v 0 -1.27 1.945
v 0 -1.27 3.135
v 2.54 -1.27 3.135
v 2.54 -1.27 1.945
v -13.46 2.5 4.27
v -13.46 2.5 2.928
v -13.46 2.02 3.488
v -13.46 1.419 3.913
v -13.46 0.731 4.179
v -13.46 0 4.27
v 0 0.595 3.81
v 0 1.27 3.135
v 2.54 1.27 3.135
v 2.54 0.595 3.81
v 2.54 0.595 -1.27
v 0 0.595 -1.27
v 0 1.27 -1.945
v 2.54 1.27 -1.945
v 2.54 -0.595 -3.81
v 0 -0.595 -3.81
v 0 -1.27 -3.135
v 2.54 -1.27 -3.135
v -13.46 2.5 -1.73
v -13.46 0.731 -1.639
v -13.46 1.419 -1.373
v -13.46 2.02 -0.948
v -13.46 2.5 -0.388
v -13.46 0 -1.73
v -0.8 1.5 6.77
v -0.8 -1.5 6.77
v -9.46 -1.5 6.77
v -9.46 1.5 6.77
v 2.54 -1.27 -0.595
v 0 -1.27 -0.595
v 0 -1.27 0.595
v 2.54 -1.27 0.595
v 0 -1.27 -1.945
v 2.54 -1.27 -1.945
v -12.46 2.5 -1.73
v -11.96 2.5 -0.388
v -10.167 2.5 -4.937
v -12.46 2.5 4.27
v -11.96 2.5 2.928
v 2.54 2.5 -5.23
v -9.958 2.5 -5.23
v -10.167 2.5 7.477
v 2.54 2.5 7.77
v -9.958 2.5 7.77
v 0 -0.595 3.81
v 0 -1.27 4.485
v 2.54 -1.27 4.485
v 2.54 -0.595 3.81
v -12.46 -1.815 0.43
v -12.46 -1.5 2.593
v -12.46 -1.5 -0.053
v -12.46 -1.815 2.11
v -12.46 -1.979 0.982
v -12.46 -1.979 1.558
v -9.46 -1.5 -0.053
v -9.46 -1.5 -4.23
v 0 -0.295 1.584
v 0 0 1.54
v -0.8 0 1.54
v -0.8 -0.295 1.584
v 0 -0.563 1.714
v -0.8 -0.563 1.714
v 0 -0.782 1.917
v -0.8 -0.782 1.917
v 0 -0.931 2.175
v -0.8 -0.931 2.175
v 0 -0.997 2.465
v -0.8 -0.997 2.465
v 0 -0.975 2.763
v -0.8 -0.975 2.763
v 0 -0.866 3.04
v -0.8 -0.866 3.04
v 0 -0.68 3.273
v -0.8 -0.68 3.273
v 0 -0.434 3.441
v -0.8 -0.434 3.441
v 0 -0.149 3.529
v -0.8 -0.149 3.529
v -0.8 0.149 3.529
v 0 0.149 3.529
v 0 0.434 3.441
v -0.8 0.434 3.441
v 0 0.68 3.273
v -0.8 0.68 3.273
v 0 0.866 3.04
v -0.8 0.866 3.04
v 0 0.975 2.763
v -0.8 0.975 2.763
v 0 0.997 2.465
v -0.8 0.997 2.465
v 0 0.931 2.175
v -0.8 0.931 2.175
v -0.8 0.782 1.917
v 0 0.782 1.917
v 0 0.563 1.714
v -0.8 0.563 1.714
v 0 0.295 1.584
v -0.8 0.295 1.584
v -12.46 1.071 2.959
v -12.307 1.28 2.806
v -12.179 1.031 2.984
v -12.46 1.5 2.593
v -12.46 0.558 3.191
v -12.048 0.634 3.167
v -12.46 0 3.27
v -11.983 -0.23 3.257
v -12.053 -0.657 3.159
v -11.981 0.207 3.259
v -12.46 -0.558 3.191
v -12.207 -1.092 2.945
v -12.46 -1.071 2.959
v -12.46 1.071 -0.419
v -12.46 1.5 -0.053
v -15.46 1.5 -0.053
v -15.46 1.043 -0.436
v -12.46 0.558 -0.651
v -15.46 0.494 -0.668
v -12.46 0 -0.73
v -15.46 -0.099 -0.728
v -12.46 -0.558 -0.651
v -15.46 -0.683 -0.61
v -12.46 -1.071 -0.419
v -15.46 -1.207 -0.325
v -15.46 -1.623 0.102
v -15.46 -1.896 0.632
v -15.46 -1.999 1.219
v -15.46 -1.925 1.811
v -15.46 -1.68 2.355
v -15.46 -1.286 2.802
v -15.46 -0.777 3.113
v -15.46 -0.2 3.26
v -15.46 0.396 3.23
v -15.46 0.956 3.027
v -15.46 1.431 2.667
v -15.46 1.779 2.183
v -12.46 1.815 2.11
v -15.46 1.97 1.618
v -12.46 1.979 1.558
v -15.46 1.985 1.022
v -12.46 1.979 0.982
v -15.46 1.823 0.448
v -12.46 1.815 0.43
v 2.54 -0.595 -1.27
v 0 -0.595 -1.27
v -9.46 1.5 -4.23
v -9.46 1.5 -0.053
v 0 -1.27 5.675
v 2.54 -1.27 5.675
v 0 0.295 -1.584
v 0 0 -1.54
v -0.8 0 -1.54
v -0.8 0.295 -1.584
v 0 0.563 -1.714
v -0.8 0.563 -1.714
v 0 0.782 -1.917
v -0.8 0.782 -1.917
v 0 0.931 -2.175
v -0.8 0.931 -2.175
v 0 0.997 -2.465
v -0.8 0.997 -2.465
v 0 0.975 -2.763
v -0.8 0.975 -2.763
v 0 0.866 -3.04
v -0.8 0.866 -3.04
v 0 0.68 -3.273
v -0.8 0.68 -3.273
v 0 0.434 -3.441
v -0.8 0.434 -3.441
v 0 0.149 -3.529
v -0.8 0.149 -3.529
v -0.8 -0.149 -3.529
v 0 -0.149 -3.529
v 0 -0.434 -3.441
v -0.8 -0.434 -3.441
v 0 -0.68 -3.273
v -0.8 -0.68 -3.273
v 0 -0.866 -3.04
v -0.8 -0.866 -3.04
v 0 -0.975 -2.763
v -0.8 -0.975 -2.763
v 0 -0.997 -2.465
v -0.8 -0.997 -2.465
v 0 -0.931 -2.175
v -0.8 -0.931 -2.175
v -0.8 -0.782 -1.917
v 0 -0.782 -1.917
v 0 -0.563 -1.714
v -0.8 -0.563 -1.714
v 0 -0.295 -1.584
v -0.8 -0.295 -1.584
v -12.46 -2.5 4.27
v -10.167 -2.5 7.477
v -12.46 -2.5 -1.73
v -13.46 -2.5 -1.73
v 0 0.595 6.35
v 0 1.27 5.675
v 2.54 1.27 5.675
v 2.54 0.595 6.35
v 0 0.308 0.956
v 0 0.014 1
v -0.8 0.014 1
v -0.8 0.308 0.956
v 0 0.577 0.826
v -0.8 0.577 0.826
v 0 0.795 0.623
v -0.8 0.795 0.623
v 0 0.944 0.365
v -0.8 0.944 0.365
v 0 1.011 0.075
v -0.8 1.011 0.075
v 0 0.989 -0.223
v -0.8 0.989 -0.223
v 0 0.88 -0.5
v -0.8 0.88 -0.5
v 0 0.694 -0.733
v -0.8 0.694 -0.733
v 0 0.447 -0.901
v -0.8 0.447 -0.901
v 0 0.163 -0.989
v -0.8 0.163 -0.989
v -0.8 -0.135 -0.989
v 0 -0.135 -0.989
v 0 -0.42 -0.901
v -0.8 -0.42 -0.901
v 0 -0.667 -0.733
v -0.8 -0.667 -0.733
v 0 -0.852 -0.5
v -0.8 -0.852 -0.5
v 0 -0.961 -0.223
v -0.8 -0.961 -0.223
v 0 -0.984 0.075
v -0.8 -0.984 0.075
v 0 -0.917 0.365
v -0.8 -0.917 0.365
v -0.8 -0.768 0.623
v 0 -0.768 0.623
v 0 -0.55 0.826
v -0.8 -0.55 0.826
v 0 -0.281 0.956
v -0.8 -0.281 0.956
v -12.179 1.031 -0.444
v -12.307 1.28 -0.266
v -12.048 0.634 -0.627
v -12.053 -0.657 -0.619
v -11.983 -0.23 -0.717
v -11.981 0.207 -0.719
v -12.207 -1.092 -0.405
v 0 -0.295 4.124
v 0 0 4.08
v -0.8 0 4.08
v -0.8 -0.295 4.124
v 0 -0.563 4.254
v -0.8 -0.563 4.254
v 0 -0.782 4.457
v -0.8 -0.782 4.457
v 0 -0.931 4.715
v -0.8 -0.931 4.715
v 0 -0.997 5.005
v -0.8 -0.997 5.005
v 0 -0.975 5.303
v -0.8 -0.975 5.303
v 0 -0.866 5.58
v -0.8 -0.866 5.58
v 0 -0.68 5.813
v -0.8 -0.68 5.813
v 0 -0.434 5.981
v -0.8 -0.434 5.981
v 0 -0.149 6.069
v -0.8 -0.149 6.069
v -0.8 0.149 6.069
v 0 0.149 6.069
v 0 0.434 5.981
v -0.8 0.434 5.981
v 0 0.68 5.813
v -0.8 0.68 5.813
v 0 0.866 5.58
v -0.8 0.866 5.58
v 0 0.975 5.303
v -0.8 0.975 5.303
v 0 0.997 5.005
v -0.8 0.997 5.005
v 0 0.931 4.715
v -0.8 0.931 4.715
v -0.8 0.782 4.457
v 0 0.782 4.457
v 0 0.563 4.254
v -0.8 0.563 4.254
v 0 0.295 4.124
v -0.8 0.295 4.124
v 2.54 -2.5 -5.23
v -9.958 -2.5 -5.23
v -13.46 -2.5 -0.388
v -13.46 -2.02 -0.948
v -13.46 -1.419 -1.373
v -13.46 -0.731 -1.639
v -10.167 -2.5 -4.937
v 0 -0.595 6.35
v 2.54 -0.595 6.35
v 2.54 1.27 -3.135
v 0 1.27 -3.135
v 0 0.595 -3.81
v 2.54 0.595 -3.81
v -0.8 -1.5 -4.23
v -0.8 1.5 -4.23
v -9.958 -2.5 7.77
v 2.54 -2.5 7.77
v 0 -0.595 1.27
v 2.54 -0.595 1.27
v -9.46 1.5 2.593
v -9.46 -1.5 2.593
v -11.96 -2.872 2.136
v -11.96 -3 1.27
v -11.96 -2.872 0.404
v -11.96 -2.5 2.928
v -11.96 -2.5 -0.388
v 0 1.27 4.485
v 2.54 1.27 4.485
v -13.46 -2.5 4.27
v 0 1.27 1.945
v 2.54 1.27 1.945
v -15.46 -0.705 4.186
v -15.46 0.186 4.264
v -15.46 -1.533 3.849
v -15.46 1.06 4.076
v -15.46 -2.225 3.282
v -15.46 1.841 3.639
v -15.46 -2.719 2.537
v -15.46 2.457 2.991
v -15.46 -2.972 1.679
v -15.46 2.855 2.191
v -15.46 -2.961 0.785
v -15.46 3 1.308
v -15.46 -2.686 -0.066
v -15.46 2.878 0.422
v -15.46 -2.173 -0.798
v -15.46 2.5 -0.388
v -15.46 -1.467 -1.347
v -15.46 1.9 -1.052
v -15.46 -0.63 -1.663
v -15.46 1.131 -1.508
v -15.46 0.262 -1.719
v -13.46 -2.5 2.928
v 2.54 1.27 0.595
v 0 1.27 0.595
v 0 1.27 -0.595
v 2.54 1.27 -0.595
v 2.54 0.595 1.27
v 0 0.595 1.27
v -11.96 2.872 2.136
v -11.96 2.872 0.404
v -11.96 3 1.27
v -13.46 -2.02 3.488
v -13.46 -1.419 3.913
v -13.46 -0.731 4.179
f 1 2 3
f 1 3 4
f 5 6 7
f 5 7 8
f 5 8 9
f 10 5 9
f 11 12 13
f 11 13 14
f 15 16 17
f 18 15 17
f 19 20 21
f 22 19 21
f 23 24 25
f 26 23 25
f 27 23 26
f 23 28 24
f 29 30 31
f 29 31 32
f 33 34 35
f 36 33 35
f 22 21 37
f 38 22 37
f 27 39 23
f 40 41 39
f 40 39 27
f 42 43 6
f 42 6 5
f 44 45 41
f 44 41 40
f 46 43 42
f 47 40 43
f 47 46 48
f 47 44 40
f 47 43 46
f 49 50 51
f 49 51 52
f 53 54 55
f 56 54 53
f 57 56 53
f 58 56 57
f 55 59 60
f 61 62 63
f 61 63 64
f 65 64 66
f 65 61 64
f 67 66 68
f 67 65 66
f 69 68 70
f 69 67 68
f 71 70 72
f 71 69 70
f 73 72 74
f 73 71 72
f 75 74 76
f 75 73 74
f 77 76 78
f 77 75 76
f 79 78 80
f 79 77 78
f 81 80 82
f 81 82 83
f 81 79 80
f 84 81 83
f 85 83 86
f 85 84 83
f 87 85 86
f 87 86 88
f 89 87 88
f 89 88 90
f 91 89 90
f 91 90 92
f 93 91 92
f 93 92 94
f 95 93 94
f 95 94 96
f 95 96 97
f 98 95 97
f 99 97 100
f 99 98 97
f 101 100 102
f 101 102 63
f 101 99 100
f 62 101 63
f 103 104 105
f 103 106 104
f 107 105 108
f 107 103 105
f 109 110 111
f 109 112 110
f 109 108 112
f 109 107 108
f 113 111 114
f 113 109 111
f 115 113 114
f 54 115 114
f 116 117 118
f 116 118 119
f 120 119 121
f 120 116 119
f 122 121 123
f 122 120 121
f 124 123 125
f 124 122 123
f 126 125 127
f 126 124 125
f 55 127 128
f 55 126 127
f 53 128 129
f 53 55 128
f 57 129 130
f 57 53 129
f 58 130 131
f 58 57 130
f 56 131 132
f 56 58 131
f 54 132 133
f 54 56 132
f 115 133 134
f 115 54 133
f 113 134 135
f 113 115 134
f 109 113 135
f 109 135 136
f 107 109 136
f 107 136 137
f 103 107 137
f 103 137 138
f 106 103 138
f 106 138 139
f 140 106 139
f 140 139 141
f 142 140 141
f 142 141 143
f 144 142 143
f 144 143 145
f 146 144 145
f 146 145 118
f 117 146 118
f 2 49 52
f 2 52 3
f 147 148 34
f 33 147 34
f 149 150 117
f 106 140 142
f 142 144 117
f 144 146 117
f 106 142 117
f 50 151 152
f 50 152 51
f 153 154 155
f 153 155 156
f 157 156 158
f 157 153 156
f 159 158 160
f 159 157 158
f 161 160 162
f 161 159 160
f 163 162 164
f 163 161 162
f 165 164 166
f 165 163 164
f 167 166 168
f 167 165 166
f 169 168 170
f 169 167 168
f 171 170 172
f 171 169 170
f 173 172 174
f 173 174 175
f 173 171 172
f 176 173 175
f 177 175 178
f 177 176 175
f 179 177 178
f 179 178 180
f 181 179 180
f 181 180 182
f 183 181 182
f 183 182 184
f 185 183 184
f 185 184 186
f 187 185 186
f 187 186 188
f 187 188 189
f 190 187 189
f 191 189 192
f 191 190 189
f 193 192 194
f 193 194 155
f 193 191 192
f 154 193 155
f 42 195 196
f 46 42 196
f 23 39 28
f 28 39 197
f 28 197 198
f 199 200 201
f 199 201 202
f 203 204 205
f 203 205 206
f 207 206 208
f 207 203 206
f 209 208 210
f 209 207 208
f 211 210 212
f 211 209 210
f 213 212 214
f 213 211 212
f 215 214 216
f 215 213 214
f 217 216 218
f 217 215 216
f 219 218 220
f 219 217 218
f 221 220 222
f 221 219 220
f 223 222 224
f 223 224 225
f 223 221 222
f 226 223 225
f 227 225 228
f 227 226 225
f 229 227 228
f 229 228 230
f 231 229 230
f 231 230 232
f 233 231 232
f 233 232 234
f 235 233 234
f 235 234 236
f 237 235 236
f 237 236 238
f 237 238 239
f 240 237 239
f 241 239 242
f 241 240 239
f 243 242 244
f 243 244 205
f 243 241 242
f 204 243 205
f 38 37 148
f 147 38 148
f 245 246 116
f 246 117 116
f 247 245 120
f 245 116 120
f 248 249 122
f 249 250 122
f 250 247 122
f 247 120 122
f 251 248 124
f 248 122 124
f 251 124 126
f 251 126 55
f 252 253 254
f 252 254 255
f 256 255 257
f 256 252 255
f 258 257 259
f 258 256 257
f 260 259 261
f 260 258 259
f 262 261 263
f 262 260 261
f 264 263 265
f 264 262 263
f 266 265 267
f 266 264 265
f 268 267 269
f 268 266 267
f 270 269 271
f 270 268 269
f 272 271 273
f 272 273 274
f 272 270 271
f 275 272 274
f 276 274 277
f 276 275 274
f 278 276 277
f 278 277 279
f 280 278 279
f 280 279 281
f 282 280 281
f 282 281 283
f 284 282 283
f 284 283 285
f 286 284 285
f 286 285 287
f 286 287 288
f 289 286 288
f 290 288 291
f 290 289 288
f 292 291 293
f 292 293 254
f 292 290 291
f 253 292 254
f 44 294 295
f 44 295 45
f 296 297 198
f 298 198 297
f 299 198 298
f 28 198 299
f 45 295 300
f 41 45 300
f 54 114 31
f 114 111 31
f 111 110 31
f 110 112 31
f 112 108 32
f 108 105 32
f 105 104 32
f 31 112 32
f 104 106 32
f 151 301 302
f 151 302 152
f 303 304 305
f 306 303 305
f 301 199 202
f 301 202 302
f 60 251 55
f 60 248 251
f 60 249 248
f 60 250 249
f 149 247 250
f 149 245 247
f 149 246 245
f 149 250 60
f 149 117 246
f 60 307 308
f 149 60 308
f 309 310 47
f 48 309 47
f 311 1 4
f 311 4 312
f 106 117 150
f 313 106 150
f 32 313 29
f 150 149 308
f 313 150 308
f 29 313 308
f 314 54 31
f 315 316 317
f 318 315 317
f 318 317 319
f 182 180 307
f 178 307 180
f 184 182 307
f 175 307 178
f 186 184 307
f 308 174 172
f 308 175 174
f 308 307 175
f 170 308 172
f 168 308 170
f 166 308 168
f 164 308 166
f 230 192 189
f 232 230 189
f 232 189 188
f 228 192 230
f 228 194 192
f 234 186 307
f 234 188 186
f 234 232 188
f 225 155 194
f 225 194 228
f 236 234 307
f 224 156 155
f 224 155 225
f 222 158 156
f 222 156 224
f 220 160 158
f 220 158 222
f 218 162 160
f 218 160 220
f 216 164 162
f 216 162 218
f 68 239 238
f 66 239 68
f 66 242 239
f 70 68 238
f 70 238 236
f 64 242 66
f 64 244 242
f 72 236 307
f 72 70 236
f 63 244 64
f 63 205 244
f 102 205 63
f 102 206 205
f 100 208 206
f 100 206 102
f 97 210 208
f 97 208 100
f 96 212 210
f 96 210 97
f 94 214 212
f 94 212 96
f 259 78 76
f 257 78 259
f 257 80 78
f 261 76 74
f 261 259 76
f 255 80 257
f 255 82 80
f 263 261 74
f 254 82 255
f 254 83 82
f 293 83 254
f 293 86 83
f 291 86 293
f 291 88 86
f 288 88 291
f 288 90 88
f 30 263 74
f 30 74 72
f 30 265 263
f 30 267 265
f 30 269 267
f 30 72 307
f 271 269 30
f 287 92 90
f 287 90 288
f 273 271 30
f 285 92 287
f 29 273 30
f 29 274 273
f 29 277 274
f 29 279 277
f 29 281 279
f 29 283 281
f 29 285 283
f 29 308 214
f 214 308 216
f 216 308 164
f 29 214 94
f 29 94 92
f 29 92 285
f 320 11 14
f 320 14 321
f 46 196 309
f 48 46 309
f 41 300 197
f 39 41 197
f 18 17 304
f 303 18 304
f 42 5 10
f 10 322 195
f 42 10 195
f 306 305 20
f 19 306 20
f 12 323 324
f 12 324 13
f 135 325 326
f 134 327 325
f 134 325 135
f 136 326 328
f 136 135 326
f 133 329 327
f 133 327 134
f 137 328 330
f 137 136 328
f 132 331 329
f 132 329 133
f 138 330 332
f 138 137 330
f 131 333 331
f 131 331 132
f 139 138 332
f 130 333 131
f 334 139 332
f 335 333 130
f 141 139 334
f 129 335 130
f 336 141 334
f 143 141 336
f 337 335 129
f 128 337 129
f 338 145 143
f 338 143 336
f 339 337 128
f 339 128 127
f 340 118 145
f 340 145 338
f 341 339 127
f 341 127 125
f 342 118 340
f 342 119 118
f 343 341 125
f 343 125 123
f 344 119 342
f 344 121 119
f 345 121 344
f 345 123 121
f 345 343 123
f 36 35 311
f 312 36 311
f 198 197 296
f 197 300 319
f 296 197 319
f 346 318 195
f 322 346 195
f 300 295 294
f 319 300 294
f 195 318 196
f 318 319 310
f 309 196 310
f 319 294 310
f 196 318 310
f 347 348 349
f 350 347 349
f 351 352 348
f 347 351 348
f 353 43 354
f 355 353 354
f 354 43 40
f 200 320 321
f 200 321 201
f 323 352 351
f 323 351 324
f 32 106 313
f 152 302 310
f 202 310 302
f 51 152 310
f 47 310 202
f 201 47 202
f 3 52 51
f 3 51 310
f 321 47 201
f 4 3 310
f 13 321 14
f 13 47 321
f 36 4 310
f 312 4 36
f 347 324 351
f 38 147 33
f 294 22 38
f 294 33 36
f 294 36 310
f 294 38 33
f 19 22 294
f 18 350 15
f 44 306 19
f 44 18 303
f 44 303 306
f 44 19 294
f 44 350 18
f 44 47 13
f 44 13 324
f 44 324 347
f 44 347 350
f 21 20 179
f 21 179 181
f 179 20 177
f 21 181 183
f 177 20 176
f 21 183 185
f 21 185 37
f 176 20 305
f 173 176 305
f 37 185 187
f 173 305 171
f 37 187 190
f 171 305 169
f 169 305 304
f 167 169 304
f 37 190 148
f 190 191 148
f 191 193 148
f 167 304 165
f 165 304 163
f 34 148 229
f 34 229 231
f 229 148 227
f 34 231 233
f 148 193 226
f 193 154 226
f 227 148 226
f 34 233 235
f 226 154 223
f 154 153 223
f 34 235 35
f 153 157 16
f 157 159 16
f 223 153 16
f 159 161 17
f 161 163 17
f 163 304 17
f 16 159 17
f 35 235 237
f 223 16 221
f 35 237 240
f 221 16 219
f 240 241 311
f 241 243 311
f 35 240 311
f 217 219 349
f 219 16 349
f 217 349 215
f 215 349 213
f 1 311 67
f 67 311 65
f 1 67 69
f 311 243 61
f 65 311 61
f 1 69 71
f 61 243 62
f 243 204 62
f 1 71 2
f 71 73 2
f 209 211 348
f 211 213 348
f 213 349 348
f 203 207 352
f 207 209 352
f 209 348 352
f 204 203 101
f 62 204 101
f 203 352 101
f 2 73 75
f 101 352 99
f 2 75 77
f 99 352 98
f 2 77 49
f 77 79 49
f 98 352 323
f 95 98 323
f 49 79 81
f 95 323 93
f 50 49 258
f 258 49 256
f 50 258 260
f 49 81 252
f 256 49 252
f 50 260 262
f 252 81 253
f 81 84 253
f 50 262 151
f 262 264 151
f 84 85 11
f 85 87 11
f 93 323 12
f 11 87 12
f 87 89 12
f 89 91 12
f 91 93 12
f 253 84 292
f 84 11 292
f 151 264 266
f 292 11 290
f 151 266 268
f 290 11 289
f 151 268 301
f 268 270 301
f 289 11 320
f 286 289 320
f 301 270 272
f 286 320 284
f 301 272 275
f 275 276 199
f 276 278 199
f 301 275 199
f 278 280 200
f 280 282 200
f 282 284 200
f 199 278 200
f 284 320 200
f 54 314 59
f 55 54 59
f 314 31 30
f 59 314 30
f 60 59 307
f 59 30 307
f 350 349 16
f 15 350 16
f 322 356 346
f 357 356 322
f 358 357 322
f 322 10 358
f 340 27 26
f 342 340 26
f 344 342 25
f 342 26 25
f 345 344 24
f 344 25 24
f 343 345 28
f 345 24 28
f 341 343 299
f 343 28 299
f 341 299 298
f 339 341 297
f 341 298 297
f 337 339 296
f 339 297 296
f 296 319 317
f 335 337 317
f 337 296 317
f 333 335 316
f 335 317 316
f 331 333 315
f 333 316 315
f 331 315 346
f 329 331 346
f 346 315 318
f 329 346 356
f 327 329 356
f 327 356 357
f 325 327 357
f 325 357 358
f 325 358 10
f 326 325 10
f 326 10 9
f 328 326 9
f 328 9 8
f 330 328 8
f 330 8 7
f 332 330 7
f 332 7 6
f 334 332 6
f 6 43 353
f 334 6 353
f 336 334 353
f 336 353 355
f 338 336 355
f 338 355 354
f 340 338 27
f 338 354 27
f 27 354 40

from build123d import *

# Parameters (mm, degrees)
CROQUIS1_W                     = 0.64
CROQUIS1_H                     = 0.64
SALIENTE_EXTRUIR1_DEPTH        = 2.54
SALIENTE_EXTRUIR2_DEPTH        = 8.54
SALIENTE_EXTRUIR2_DEPTH_BACK   = 3
CROQUIS3_W                     = 0.64
CROQUIS3_H                     = 0.64
SALIENTE_EXTRUIR2_2_DEPTH      = 8.54
SALIENTE_EXTRUIR2_2_DEPTH_BACK = 3
CHAFL_N1_SIZE                  = 0.2
CHAFL_N2_SIZE                  = 0.2
CROQUIS1_4_W                   = 11
CROQUIS1_4_H                   = 3
BOSS_EXTRUDE6_DEPTH            = 2.54
SKETCH6_W                      = 11
SKETCH6_H                      = 3
SKETCH6_R                      = 1
BOSS_EXTRUDE11_DEPTH           = 0.8
SKETCH7_W                      = 13
SKETCH7_H                      = 5
SKETCH7_W_2                    = 11
SKETCH7_H_2                    = 3
BOSS_EXTRUDE12_DEPTH           = 15
SKETCH8_W                      = 13
SKETCH8_H                      = 5
SKETCH8_R                      = 2
BOSS_EXTRUDE13_DEPTH           = 1
BOSS_EXTRUDE15_DEPTH           = 2
BOSS_EXTRUDE15_DEPTH_BACK      = 1.5
SKETCH9_R                      = 3
SKETCH9_R_2                    = 2
SKETCH10_W                     = 0.5
SKETCH10_H                     = 1.275200555
CUT_EXTRUDE2_DEPTH             = 3
BOSS_EXTRUDE20_DEPTH           = 3
CUT_EXTRUDE3_DEPTH             = 3
CUT_EXTRUDE5_DEPTH             = 18.878324866
CUT_EXTRUDE5_DEPTH_BACK        = 18.878324866


with BuildPart() as part:
    # Croquis1 → Saliente-Extruir1 (new body)
    # profile 1 of 2: a face of its own
    with BuildSketch(Plane(origin=(0, 0, 0), x_dir=(0, 0, -1), z_dir=(1, 0, 0))):
        Polygon((1.27, 0.595482683), (1.27, -0.595482683), (0.595482683, -1.27), (-0.595482683, -1.27), (-1.27, -0.595482683), (-1.27, 0.595482683), (-0.595482683, 1.27), (0.595482683, 1.27), align=None)
        Rectangle(CROQUIS1_W, CROQUIS1_H, mode=Mode.SUBTRACT)
    # profile 2 of 2: a face of its own
    with BuildSketch(Plane(origin=(0, 0, 0), x_dir=(0, 0, -1), z_dir=(1, 0, 0))):
        Polygon((3.135482683, 1.27), (3.81, 0.595482683), (3.81, -0.595482683), (3.135482683, -1.27), (1.944517317, -1.27), (1.27, -0.595482683), (1.27, 0.595482683), (1.944517317, 1.27), align=None)
        with Locations((2.54, 0)):
            Rectangle(CROQUIS1_W, CROQUIS1_H, mode=Mode.SUBTRACT)
    extrude(amount=SALIENTE_EXTRUIR1_DEPTH)

    # Mirror5: part across plane


with BuildPart() as body_2:
    # Croquis3 → Saliente-Extruir2 (new, two sides: drawn at the far end of the back side and taken through both)
    with BuildSketch(Plane(origin=(0, 0, 0), x_dir=(0, 0, -1), z_dir=(1, 0, 0)).offset(-SALIENTE_EXTRUIR2_DEPTH_BACK)):
        Rectangle(CROQUIS3_W, CROQUIS3_H)
    extrude(amount=SALIENTE_EXTRUIR2_DEPTH + SALIENTE_EXTRUIR2_DEPTH_BACK)

    # Chaflán1
    chafl_n1_edges = [body_2.edges().sort_by_distance(p)[0] for p in [
        (-3, 0, -0.32),
        (8.54, 0, 0.32),
        (8.54, -0.32, 0),
        (-3, 0.32, 0),
        (8.54, 0, -0.32),
        (8.54, 0.32, 0),
        (-3, 0, 0.32),
        (-3, -0.32, 0),
    ]]
    chamfer(chafl_n1_edges, length=CHAFL_N1_SIZE)


with BuildPart() as body_3:
    # Croquis3 → Saliente-Extruir2 2 (new, two sides: drawn at the far end of the back side and taken through both)
    with BuildSketch(Plane(origin=(0, 0, 0), x_dir=(0, 0, -1), z_dir=(1, 0, 0)).offset(-SALIENTE_EXTRUIR2_2_DEPTH_BACK)):
        with Locations((2.54, 0)):
            Rectangle(CROQUIS3_W, CROQUIS3_H)
    extrude(amount=SALIENTE_EXTRUIR2_2_DEPTH + SALIENTE_EXTRUIR2_2_DEPTH_BACK)

    # Chaflán2
    chafl_n2_edges = [body_3.edges().sort_by_distance(p)[0] for p in [
        (-3, 0, -2.86),
        (8.54, 0, -2.22),
        (8.54, -0.32, -2.54),
        (-3, 0.32, -2.54),
        (8.54, 0, -2.86),
        (8.54, 0.32, -2.54),
        (-3, 0, -2.22),
        (-3, -0.32, -2.54),
    ]]
    chamfer(chafl_n2_edges, length=CHAFL_N2_SIZE)


with BuildPart() as body_4:
    # Mirror3: mirrored copy
    add(body_2.part.mirror(Plane(origin=(2.54, 0, 1.27), x_dir=(1, 0, 0), z_dir=(0, 0, -1))))


with BuildPart() as body_5:
    # Mirror3 2: mirrored copy
    add(body_3.part.mirror(Plane(origin=(2.54, 0, 1.27), x_dir=(1, 0, 0), z_dir=(0, 0, -1))))


with BuildPart() as part_1:
    add(part.part)
    add(part.part.mirror(Plane(origin=(2.54, 0, 1.27), x_dir=(1, 0, 0), z_dir=(0, 0, -1))))


with BuildPart() as body_6:
    # Croquis1<4> → Boss-Extrude6 (new body)
    with BuildSketch(Plane(origin=(0, 0, 0), x_dir=(0, 0, -1), z_dir=(1, 0, 0))):
        with Locations((-1.27, 0)):
            Rectangle(CROQUIS1_4_W, CROQUIS1_4_H)
        Polygon((1.944517317, 1.27), (3.135482683, 1.27), (3.81, 0.595482683), (3.81, -0.595482683), (3.135482683, -1.27), (1.944517317, -1.27), (1.27, -0.595482683), (0.595482683, -1.27), (-0.595482683, -1.27), (-1.27, -0.595482683), (-1.27, 0.595482683), (-0.595482683, 1.27), (0.595482683, 1.27), (1.27, 0.595482683), align=None, mode=Mode.SUBTRACT)
    extrude(amount=BOSS_EXTRUDE6_DEPTH)

    # Combine5: cut body 2, body 3, body 4, body 5, part
    add(body_2.part, mode=Mode.SUBTRACT)
    add(body_3.part, mode=Mode.SUBTRACT)
    add(body_4.part, mode=Mode.SUBTRACT)
    add(body_5.part, mode=Mode.SUBTRACT)
    add(part_1.part, mode=Mode.SUBTRACT)

    # Sketch6 → Boss-Extrude11 (add)
    with BuildSketch(Plane.ZY):
        with Locations((1.27, 0)):
            Rectangle(SKETCH6_W, SKETCH6_H)
        with Locations((-2.54, 0)):
            Circle(SKETCH6_R, mode=Mode.SUBTRACT)
        with Locations((0, 0.013602928)):
            Circle(SKETCH6_R, mode=Mode.SUBTRACT)
        with Locations(Location((2.54, 0, 0), (0, 0, 180))):
            Circle(SKETCH6_R, mode=Mode.SUBTRACT)
        with Locations(Location((5.08, 0, 0), (0, 0, 180))):
            Circle(SKETCH6_R, mode=Mode.SUBTRACT)
    extrude(amount=BOSS_EXTRUDE11_DEPTH)

    # Sketch7 → Boss-Extrude12 (add)
    with BuildSketch(Plane(origin=(2.54, 0, 0), x_dir=(0, 0, -1), z_dir=(1, 0, 0))):
        with Locations((-1.27, 0)):
            Rectangle(SKETCH7_W, SKETCH7_H)
        with Locations((-1.27, 0)):
            Rectangle(SKETCH7_W_2, SKETCH7_H_2, mode=Mode.SUBTRACT)
    extrude(amount=-BOSS_EXTRUDE12_DEPTH)

    # Sketch8 → Boss-Extrude13 (add)
    with BuildSketch(Plane.ZY.offset(12.46)):
        with Locations((1.27, 0)):
            Rectangle(SKETCH8_W, SKETCH8_H)
        with Locations(Location((1.27, 0, 0), (0, 0, 131.409622109))):
            Circle(SKETCH8_R, mode=Mode.SUBTRACT)
    extrude(amount=BOSS_EXTRUDE13_DEPTH)

    # Sketch9 → Boss-Extrude15 (add, two sides: drawn at the far end of the back side and taken through both)
    with BuildSketch(Plane.ZY.offset(13.46).offset(-BOSS_EXTRUDE15_DEPTH_BACK)):
        with Locations(Location((1.27, 0, 0), (0, 0, 123.557309762))):
            Circle(SKETCH9_R)
        with Locations(Location((1.27, 0, 0), (0, 0, 131.409622109))):
            Circle(SKETCH9_R_2, mode=Mode.SUBTRACT)
    extrude(amount=BOSS_EXTRUDE15_DEPTH + BOSS_EXTRUDE15_DEPTH_BACK)

    # Sketch10 → Cut-Extrude2 (cut)
    with BuildSketch(Plane(origin=(0, -1.5, 0), x_dir=(1, 0, 0), z_dir=(0, 1, 0))):
        Polygon((-12.46, -3.868076211), (-12.46, -4.27), (-11.96, -4.27), (-10.789863612, -4.27), (-10.789863612, 1.73), (-12.46, 1.73), (-12.46, 1.328076211), (-11.96, 1.328076211), (-11.96, 0.052875656), (-12.46, 0.052875656), (-12.46, -2.592875656), (-11.96, -2.592875656), (-11.96, -3.868076211), align=None)
        with Locations((-12.21, -3.230475934)):
            Rectangle(SKETCH10_W, SKETCH10_H)
        with Locations((-12.21, 0.690475934)):
            Rectangle(SKETCH10_W, SKETCH10_H)
    extrude(amount=CUT_EXTRUDE2_DEPTH, mode=Mode.SUBTRACT)

    # Sketch15 → Boss-Extrude20 (add)
    with BuildSketch(Plane(origin=(-12.46, 0, 0), x_dir=(0, 0, -1), z_dir=(1, 0, 0))):
        with BuildLine():
            Line((4.23, -1.5), (4.23, 1.5))
            Line((4.23, 1.5), (0.052875656, 1.5))
            ThreePointArc((0.052875656, 1.5), (0.73, 0), (0.052875656, -1.5))
            Line((0.052875656, -1.5), (4.23, -1.5))
        make_face()
        with BuildLine():
            Line((-2.592875656, -1.5), (-6.77, -1.5))
            Line((-6.77, -1.5), (-6.77, 1.5))
            Line((-6.77, 1.5), (-2.592875656, 1.5))
            ThreePointArc((-2.592875656, 1.5), (-3.27, 0), (-2.592875656, -1.5))
        make_face()
    extrude(amount=BOSS_EXTRUDE20_DEPTH)

    # Sketch16 → Cut-Extrude3 (cut)
    with BuildSketch(Plane(origin=(0, 1.5, 0), x_dir=(1, 0, 0), z_dir=(0, 1, 0))):
        Polygon((-9.46, -2.592875656), (-12.46, -2.592875656), (-9.46, -6.77), align=None)
        Polygon((-12.46, 0.052875656), (-9.46, 4.23), (-9.46, 0.052875656), align=None)
    extrude(amount=-CUT_EXTRUDE3_DEPTH, mode=Mode.SUBTRACT)

    # Sketch19 → Cut-Extrude5 (cut, two sides: drawn at the far end of the back side and taken through both)
    with BuildSketch(Plane(origin=(0, 1.5, 0), x_dir=(1, 0, 0), z_dir=(0, 1, 0)).offset(-CUT_EXTRUDE5_DEPTH_BACK)):
        Polygon((-13.46, 5.23), (-9.957705311, 5.23), (-10.167106781, 4.937106781), (-12.46, 1.73), (-13.46, 1.73), align=None)
        Polygon((-13.46, -4.27), (-12.46, -4.27), (-10.167106781, -7.477106781), (-9.957705311, -7.77), (-13.46, -7.77), align=None)
    extrude(amount=CUT_EXTRUDE5_DEPTH + CUT_EXTRUDE5_DEPTH_BACK, mode=Mode.SUBTRACT)


solid = body_6.part
